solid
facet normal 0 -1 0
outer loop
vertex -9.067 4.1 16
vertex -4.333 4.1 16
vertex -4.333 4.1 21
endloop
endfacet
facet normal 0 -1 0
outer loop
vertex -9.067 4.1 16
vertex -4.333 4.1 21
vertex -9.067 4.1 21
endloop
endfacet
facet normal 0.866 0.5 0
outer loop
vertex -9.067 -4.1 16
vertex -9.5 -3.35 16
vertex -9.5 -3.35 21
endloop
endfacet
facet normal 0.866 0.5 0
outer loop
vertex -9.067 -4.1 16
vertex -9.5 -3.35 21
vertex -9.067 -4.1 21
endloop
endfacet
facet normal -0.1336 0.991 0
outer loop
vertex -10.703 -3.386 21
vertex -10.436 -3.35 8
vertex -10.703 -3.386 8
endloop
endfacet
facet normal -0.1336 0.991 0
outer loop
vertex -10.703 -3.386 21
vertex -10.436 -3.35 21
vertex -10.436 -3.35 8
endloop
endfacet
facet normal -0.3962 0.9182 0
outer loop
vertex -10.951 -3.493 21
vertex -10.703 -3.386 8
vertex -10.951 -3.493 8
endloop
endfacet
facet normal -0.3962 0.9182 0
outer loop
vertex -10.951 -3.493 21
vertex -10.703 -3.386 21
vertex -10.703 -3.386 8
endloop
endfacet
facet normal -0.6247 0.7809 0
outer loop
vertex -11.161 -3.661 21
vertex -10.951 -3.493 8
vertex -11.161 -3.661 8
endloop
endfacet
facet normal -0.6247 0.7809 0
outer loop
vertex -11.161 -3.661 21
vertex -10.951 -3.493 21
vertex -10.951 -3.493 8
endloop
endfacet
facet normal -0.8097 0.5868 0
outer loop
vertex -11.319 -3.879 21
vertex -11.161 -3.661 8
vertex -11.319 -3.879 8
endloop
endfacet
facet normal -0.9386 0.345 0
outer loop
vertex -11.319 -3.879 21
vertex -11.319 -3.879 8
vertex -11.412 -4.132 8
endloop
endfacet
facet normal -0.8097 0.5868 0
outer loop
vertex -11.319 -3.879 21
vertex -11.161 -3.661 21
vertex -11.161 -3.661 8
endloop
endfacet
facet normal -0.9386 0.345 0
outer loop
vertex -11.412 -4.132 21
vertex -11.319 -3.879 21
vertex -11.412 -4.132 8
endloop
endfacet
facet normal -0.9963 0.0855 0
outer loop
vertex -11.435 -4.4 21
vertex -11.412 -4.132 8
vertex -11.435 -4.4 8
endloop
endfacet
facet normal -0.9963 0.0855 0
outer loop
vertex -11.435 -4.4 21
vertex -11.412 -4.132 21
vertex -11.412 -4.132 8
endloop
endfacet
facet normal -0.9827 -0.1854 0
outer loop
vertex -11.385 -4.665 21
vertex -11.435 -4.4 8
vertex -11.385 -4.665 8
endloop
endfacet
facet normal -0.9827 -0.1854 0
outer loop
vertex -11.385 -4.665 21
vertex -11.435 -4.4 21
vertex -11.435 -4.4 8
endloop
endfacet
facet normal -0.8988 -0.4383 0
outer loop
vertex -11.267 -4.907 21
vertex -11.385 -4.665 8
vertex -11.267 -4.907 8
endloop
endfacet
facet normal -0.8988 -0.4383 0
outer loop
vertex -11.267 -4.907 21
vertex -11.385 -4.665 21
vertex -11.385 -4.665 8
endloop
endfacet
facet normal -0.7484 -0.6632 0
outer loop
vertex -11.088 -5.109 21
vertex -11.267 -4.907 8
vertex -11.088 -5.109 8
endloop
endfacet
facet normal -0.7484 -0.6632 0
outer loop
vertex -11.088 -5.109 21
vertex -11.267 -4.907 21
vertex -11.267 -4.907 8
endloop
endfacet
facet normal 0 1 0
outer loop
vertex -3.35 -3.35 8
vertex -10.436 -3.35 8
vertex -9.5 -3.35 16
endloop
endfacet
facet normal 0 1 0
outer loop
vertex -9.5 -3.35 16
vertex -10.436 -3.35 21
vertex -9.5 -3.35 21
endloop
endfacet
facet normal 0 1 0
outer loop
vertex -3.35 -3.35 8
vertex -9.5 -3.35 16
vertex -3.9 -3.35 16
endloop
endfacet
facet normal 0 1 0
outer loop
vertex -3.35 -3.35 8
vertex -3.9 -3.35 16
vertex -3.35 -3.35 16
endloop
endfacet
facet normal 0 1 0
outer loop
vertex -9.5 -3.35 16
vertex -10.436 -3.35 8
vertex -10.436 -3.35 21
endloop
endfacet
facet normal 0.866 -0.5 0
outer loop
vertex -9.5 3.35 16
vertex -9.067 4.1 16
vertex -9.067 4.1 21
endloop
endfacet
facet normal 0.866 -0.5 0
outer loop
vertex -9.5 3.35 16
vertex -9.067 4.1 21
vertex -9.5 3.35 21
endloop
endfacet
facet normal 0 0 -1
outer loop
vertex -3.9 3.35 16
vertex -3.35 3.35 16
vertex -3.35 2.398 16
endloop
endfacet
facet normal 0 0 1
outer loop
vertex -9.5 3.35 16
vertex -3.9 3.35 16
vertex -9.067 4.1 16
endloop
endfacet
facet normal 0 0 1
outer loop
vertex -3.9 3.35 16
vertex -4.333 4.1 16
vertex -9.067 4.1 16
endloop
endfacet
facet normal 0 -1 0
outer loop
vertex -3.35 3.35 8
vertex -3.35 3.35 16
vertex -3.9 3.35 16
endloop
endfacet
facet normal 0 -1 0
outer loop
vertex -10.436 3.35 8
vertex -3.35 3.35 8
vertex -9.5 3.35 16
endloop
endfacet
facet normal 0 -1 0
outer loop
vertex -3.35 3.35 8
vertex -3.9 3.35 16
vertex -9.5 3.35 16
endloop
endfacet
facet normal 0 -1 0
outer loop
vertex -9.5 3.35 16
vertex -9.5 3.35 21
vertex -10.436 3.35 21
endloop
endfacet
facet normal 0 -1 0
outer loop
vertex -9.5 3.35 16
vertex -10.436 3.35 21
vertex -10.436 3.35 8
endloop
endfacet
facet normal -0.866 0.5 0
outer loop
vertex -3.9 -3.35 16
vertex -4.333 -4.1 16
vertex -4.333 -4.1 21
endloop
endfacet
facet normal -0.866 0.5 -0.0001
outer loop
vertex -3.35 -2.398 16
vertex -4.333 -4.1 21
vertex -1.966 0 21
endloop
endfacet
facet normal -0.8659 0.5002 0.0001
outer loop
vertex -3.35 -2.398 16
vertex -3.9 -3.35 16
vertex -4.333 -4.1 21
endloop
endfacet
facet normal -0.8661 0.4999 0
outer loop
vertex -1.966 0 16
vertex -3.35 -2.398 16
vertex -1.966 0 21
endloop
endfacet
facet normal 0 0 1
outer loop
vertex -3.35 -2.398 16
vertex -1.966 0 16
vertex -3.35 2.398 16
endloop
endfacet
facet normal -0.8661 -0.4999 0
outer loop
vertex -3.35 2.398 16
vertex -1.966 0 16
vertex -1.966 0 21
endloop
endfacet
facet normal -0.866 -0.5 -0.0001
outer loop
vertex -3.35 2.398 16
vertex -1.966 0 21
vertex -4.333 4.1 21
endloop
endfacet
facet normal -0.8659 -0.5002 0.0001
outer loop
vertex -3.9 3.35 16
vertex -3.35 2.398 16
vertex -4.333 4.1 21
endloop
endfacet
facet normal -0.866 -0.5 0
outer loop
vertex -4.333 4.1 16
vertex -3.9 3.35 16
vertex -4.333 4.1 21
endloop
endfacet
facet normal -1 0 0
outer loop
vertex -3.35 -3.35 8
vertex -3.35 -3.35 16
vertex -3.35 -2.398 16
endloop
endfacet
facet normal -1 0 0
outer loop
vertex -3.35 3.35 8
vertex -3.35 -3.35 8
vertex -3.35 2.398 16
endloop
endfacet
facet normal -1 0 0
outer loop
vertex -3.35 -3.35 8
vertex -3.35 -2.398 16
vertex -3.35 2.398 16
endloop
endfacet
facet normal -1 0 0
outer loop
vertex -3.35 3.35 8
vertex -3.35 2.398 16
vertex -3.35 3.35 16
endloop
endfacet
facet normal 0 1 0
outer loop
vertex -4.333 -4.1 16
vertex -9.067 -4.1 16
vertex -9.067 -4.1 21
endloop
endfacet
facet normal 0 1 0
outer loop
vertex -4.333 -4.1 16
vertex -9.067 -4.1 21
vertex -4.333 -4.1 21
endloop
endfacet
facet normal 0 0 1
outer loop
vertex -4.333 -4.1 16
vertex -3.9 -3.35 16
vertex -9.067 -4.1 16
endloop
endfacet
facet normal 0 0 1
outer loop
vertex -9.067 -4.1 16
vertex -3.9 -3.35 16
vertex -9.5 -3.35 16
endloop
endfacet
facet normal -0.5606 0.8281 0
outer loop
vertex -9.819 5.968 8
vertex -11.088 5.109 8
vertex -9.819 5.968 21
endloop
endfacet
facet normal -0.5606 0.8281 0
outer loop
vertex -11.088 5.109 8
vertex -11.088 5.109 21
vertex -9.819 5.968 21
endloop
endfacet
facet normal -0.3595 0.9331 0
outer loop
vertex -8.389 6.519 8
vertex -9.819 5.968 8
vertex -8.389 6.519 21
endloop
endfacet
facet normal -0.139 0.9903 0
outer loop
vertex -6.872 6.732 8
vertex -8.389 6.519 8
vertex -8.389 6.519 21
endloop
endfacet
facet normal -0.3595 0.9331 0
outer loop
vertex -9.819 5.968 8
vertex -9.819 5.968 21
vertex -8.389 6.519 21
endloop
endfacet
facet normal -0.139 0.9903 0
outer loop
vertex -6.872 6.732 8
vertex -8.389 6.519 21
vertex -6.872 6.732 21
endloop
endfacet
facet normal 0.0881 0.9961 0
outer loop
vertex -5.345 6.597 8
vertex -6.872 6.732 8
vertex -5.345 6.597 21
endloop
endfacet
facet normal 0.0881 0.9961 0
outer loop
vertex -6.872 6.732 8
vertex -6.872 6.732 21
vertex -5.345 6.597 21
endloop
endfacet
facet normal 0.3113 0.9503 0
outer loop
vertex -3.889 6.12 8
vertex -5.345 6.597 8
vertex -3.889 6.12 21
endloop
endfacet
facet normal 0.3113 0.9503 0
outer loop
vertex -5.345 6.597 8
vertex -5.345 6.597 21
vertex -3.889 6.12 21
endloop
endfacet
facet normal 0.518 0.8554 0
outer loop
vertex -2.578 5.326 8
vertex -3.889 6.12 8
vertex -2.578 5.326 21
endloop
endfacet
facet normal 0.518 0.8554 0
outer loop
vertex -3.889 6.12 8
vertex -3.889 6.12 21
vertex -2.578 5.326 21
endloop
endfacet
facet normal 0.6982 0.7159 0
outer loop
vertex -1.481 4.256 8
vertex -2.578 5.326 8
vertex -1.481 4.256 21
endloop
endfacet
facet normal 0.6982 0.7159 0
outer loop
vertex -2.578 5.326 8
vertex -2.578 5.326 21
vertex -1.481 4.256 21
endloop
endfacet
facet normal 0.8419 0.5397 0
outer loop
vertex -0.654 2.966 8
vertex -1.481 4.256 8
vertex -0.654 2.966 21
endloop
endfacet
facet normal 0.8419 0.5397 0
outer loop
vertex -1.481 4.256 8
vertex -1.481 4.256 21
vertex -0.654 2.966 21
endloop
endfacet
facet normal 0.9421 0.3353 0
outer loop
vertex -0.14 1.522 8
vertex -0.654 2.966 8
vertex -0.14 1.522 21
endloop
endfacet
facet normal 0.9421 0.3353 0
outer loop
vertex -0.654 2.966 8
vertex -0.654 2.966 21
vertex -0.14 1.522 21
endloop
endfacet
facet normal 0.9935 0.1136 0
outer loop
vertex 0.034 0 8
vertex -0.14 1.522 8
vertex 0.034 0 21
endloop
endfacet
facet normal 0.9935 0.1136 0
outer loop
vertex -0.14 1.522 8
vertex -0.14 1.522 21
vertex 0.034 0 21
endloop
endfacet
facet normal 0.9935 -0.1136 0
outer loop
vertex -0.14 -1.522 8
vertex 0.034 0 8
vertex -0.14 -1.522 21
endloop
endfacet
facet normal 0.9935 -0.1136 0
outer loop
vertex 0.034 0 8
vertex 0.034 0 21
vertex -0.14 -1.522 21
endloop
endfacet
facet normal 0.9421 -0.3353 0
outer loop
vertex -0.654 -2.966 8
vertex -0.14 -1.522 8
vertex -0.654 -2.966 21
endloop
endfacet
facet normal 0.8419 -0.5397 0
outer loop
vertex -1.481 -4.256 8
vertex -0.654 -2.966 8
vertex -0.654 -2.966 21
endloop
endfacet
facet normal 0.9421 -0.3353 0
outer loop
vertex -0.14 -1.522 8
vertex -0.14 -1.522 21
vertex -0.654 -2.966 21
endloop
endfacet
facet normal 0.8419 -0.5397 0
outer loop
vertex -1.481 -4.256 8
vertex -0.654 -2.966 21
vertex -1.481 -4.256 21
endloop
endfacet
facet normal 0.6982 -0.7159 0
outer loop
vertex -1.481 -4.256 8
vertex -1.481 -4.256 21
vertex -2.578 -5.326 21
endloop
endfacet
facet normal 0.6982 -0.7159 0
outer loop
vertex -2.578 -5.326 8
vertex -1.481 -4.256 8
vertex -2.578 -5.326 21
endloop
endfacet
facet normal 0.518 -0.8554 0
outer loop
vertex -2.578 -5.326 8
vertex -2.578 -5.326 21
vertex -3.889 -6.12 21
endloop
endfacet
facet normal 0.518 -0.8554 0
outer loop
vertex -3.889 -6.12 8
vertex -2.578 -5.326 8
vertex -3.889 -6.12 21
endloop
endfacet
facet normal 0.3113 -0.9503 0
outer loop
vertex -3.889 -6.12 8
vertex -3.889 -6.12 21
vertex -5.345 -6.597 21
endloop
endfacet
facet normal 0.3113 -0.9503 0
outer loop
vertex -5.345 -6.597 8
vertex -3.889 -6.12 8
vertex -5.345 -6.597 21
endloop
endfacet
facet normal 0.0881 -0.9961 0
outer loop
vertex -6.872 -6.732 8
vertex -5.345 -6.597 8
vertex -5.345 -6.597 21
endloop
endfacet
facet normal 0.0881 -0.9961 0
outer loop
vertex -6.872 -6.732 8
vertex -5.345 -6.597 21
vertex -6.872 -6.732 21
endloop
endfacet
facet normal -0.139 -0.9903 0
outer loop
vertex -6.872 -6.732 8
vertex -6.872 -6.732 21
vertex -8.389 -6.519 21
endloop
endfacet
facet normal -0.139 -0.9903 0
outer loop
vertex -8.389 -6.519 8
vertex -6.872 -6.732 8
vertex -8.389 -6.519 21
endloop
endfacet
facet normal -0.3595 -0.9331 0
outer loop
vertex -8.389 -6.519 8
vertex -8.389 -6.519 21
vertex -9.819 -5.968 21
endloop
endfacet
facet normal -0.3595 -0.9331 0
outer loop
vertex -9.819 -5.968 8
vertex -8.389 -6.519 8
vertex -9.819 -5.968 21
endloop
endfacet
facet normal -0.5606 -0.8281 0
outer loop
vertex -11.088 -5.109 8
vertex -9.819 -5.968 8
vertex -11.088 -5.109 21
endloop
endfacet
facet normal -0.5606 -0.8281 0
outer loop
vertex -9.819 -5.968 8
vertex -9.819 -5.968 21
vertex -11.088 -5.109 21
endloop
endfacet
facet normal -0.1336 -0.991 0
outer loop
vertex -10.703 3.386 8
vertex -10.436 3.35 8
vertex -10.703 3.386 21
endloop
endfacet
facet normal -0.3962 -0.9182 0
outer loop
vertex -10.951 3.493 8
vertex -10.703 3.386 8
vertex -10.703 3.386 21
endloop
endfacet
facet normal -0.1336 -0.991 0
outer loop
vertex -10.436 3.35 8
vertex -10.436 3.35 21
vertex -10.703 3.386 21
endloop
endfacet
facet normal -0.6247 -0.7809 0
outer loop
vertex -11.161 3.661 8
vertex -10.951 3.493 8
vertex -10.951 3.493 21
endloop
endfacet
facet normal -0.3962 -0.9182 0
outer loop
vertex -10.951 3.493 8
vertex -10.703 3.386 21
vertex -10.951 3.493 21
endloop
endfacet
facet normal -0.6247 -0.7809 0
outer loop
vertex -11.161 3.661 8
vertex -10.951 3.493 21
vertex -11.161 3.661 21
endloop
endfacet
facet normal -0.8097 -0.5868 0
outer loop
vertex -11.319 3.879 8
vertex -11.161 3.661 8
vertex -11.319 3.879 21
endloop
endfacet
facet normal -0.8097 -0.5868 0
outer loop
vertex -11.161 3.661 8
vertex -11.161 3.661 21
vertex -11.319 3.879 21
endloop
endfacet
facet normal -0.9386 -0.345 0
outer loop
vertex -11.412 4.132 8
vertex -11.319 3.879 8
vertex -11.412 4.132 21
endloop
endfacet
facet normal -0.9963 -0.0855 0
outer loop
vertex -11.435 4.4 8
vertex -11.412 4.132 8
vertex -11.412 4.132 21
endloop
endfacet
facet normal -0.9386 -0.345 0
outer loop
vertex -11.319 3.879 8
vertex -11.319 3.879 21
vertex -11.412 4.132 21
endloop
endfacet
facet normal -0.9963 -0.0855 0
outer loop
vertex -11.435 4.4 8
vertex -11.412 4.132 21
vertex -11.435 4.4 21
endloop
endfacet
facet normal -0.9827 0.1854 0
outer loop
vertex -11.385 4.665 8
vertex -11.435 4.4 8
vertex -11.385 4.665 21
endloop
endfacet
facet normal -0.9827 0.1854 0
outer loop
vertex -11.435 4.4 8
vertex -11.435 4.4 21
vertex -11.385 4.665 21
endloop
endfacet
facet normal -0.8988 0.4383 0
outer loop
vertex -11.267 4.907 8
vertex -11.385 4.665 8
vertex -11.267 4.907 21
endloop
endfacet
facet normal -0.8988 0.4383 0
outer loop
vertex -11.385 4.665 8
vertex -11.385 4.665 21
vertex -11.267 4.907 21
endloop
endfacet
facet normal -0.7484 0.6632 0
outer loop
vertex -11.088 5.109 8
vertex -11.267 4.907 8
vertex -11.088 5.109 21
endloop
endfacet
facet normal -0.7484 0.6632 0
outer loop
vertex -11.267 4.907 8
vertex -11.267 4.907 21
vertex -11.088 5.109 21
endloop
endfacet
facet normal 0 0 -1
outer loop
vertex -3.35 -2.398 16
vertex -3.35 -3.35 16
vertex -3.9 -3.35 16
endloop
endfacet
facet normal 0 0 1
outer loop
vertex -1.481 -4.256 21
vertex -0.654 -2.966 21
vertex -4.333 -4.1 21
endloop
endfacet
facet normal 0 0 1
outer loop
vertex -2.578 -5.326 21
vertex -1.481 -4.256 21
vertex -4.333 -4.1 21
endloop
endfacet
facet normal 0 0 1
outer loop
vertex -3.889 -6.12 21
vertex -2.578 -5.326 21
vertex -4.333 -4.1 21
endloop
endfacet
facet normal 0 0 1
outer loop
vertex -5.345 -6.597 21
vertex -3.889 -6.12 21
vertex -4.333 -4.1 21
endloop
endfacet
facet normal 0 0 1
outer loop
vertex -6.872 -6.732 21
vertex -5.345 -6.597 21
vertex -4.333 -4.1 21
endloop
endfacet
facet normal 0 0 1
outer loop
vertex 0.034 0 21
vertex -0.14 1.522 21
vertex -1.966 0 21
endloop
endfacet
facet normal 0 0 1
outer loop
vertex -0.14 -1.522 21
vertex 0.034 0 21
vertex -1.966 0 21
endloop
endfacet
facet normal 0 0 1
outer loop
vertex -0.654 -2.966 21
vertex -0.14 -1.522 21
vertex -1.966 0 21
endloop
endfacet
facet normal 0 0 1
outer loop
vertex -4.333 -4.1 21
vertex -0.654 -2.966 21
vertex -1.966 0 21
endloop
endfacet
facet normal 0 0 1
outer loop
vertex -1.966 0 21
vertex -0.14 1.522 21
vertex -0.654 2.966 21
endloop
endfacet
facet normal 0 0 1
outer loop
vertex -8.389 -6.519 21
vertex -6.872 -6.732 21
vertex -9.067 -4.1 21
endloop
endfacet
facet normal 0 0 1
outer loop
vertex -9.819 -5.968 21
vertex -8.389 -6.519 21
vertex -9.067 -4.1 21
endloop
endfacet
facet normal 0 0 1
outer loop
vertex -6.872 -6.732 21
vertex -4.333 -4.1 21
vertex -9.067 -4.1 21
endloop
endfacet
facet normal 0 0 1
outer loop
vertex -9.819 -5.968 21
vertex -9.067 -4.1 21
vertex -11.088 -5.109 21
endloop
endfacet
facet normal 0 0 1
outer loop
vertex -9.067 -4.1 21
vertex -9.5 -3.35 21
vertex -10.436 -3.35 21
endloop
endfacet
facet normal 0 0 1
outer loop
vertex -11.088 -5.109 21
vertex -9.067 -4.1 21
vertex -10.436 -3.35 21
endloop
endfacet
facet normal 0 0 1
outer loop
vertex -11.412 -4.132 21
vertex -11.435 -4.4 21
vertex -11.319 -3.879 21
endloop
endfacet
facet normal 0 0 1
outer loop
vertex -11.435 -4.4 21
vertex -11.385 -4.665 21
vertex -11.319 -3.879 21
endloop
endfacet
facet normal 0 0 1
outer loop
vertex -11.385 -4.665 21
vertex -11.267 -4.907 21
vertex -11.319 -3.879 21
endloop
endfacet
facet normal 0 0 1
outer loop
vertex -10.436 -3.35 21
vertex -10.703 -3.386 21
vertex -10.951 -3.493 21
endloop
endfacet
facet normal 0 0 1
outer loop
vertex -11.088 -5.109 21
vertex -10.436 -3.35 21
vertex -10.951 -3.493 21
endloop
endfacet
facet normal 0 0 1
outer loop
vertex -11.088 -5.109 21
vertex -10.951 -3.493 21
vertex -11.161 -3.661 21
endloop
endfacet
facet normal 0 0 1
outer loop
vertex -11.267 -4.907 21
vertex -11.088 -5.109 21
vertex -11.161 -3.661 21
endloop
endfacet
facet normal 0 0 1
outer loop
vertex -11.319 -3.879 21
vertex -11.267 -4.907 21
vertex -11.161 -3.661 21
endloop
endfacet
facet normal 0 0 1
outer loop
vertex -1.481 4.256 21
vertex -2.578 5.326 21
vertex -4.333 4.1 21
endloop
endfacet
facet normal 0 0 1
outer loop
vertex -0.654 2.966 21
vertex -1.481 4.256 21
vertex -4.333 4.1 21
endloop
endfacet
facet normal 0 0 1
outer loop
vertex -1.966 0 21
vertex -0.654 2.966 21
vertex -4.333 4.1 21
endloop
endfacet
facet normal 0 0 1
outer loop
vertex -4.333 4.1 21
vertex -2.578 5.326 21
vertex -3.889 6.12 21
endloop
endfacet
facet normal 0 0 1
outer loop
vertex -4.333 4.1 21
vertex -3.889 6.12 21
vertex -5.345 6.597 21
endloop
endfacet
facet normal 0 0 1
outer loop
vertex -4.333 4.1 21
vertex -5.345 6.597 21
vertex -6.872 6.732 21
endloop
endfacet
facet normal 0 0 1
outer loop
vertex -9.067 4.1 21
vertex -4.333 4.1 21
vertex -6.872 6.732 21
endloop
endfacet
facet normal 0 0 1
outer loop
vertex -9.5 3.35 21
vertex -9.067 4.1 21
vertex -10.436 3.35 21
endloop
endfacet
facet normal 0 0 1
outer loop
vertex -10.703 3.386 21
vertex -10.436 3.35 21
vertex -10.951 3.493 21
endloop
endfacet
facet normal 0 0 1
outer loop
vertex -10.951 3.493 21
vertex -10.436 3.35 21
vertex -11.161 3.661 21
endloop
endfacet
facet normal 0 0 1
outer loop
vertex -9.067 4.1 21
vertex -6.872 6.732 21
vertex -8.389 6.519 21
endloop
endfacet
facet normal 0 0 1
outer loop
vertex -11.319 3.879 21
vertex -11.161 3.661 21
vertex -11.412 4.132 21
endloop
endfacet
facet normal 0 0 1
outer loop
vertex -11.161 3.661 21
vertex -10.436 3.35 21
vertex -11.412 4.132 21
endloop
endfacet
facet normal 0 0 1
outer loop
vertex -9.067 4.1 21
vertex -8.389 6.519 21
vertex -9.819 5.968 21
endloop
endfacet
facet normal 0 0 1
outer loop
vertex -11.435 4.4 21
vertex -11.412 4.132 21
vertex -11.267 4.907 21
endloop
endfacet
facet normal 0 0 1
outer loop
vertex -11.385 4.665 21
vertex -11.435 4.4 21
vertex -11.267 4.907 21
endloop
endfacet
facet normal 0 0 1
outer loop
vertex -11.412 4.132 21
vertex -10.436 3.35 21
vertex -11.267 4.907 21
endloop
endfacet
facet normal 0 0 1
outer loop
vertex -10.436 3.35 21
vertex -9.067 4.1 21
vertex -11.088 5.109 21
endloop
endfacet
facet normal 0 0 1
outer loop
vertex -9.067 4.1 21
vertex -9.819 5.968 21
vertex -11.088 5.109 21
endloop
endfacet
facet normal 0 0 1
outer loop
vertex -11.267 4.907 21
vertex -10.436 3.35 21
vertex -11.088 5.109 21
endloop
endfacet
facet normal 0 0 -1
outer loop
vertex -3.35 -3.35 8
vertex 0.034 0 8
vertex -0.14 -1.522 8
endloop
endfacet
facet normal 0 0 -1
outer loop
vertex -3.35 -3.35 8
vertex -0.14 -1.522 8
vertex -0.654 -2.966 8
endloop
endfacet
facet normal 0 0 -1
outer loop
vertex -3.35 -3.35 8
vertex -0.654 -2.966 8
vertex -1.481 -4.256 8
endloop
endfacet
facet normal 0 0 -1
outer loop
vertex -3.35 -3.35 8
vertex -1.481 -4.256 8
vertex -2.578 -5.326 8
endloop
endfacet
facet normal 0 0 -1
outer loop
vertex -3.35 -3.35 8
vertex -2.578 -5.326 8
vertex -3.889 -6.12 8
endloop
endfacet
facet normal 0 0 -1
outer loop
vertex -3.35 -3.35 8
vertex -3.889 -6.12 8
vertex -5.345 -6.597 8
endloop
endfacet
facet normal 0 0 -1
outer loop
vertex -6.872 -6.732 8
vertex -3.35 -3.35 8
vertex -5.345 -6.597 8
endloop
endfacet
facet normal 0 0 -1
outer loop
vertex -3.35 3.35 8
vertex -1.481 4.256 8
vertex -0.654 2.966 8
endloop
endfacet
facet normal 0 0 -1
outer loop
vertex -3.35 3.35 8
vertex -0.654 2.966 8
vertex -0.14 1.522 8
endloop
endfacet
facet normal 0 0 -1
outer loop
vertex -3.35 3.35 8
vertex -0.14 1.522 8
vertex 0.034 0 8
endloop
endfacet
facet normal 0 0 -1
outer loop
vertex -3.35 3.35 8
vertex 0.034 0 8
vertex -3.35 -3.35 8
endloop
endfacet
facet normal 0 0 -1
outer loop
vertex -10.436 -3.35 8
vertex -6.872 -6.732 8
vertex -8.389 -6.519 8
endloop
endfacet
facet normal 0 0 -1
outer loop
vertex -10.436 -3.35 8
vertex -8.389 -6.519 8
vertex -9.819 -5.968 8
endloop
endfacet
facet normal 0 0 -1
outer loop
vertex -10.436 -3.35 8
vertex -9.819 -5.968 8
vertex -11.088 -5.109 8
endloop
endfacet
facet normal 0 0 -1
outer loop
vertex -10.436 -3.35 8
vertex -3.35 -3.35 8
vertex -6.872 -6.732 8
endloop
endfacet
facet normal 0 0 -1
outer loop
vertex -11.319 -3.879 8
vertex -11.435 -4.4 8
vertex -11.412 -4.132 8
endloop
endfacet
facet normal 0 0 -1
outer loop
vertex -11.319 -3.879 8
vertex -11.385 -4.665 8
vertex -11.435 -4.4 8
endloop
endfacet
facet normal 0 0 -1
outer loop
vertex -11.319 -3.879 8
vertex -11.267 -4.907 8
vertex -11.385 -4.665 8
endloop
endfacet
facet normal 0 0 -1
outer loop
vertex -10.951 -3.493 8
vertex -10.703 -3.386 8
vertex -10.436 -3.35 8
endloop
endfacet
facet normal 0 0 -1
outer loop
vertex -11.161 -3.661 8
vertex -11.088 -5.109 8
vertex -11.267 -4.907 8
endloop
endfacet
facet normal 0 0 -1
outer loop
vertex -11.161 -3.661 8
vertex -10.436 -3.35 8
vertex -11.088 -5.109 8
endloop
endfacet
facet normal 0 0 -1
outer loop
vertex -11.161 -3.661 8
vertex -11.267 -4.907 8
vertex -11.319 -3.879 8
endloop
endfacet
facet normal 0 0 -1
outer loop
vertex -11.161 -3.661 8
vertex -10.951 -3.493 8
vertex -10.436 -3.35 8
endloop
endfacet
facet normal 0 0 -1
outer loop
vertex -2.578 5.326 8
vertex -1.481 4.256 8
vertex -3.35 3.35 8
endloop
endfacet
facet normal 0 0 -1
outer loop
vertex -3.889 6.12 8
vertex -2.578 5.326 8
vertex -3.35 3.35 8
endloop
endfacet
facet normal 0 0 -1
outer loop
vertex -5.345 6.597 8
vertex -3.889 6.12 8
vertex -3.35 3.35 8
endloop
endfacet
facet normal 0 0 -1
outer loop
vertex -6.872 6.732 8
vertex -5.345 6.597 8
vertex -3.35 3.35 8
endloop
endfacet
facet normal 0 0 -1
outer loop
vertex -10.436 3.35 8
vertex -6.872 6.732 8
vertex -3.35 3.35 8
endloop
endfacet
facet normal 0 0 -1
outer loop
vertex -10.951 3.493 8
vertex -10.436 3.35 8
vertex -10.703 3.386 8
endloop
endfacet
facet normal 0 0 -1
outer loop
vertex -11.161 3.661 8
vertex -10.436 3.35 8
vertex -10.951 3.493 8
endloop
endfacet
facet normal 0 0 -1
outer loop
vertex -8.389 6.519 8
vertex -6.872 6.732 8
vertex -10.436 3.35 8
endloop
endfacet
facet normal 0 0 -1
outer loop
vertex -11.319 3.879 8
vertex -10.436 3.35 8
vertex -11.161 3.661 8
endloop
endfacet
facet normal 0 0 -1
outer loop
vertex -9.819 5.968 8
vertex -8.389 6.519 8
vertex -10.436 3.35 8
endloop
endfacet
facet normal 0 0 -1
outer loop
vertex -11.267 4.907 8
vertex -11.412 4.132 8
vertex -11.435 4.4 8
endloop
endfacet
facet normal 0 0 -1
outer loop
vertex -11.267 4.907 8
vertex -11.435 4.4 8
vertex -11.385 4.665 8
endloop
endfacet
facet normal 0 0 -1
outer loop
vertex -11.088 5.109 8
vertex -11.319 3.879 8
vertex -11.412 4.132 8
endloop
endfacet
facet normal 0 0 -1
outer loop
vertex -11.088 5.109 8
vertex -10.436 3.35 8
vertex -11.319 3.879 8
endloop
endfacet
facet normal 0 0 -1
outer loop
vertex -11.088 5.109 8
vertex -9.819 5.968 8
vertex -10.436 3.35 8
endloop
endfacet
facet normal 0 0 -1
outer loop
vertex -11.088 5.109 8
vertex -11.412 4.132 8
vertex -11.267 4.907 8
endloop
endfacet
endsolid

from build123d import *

# Parameters (mm, degrees)
F1_DEPTH = 5
F3_DEPTH = 8
F4_R     = 1
F5_ANGLE = 180


with BuildPart() as f1:
    # F0 (on Top) → F1 (new body)
    with BuildSketch(Plane.XY):
        with BuildLine():
            Line((-4.734272, 0), (-2.367136, 4.1))
            Line((-2.367136, 4.1), (2.367136, 4.1))
            Line((2.367136, 4.1), (2.800149, 3.35))
            Line((2.800149, 3.35), (5.841911, 3.35))
            ThreePointArc((5.841911, 3.35), (-6.734272, 0), (5.841911, -3.35))
            Line((5.841911, -3.35), (2.800149, -3.35))
            Line((2.800149, -3.35), (2.367136, -4.1))
            Line((2.367136, -4.1), (-2.367136, -4.1))
            Line((-2.367136, -4.1), (-4.734272, 0))
        make_face()
    extrude(amount=-F1_DEPTH)

    # F2 (on Top) → F3 (join)
    with BuildSketch(Plane.XY):
        with BuildLine():
            Line((5.841911, -3.35), (3.35, -3.35))
            Line((3.35, -3.35), (-3.35, -3.35))
            Line((-3.35, -3.35), (-3.35, 3.35))
            Line((-3.35, 3.35), (3.35, 3.35))
            Line((3.35, 3.35), (5.841911, 3.35))
            ThreePointArc((5.841911, 3.35), (-6.734272, 0), (5.841911, -3.35))
        make_face()
    extrude(amount=F3_DEPTH)

    # F4
    f4_edges = [f1.edges().sort_by_distance(p)[0] for p in [
        (5.841911, 3.35, 1.5),
        (5.841911, -3.35, 1.5),
    ]]
    fillet(f4_edges, radius=F4_R)


with BuildPart() as f1_1:
    # F5: moved
    add(f1.part.rotate(Axis((-3.35, 0, 8), (0, -1, 0)), F5_ANGLE))


solid = f1_1.part
